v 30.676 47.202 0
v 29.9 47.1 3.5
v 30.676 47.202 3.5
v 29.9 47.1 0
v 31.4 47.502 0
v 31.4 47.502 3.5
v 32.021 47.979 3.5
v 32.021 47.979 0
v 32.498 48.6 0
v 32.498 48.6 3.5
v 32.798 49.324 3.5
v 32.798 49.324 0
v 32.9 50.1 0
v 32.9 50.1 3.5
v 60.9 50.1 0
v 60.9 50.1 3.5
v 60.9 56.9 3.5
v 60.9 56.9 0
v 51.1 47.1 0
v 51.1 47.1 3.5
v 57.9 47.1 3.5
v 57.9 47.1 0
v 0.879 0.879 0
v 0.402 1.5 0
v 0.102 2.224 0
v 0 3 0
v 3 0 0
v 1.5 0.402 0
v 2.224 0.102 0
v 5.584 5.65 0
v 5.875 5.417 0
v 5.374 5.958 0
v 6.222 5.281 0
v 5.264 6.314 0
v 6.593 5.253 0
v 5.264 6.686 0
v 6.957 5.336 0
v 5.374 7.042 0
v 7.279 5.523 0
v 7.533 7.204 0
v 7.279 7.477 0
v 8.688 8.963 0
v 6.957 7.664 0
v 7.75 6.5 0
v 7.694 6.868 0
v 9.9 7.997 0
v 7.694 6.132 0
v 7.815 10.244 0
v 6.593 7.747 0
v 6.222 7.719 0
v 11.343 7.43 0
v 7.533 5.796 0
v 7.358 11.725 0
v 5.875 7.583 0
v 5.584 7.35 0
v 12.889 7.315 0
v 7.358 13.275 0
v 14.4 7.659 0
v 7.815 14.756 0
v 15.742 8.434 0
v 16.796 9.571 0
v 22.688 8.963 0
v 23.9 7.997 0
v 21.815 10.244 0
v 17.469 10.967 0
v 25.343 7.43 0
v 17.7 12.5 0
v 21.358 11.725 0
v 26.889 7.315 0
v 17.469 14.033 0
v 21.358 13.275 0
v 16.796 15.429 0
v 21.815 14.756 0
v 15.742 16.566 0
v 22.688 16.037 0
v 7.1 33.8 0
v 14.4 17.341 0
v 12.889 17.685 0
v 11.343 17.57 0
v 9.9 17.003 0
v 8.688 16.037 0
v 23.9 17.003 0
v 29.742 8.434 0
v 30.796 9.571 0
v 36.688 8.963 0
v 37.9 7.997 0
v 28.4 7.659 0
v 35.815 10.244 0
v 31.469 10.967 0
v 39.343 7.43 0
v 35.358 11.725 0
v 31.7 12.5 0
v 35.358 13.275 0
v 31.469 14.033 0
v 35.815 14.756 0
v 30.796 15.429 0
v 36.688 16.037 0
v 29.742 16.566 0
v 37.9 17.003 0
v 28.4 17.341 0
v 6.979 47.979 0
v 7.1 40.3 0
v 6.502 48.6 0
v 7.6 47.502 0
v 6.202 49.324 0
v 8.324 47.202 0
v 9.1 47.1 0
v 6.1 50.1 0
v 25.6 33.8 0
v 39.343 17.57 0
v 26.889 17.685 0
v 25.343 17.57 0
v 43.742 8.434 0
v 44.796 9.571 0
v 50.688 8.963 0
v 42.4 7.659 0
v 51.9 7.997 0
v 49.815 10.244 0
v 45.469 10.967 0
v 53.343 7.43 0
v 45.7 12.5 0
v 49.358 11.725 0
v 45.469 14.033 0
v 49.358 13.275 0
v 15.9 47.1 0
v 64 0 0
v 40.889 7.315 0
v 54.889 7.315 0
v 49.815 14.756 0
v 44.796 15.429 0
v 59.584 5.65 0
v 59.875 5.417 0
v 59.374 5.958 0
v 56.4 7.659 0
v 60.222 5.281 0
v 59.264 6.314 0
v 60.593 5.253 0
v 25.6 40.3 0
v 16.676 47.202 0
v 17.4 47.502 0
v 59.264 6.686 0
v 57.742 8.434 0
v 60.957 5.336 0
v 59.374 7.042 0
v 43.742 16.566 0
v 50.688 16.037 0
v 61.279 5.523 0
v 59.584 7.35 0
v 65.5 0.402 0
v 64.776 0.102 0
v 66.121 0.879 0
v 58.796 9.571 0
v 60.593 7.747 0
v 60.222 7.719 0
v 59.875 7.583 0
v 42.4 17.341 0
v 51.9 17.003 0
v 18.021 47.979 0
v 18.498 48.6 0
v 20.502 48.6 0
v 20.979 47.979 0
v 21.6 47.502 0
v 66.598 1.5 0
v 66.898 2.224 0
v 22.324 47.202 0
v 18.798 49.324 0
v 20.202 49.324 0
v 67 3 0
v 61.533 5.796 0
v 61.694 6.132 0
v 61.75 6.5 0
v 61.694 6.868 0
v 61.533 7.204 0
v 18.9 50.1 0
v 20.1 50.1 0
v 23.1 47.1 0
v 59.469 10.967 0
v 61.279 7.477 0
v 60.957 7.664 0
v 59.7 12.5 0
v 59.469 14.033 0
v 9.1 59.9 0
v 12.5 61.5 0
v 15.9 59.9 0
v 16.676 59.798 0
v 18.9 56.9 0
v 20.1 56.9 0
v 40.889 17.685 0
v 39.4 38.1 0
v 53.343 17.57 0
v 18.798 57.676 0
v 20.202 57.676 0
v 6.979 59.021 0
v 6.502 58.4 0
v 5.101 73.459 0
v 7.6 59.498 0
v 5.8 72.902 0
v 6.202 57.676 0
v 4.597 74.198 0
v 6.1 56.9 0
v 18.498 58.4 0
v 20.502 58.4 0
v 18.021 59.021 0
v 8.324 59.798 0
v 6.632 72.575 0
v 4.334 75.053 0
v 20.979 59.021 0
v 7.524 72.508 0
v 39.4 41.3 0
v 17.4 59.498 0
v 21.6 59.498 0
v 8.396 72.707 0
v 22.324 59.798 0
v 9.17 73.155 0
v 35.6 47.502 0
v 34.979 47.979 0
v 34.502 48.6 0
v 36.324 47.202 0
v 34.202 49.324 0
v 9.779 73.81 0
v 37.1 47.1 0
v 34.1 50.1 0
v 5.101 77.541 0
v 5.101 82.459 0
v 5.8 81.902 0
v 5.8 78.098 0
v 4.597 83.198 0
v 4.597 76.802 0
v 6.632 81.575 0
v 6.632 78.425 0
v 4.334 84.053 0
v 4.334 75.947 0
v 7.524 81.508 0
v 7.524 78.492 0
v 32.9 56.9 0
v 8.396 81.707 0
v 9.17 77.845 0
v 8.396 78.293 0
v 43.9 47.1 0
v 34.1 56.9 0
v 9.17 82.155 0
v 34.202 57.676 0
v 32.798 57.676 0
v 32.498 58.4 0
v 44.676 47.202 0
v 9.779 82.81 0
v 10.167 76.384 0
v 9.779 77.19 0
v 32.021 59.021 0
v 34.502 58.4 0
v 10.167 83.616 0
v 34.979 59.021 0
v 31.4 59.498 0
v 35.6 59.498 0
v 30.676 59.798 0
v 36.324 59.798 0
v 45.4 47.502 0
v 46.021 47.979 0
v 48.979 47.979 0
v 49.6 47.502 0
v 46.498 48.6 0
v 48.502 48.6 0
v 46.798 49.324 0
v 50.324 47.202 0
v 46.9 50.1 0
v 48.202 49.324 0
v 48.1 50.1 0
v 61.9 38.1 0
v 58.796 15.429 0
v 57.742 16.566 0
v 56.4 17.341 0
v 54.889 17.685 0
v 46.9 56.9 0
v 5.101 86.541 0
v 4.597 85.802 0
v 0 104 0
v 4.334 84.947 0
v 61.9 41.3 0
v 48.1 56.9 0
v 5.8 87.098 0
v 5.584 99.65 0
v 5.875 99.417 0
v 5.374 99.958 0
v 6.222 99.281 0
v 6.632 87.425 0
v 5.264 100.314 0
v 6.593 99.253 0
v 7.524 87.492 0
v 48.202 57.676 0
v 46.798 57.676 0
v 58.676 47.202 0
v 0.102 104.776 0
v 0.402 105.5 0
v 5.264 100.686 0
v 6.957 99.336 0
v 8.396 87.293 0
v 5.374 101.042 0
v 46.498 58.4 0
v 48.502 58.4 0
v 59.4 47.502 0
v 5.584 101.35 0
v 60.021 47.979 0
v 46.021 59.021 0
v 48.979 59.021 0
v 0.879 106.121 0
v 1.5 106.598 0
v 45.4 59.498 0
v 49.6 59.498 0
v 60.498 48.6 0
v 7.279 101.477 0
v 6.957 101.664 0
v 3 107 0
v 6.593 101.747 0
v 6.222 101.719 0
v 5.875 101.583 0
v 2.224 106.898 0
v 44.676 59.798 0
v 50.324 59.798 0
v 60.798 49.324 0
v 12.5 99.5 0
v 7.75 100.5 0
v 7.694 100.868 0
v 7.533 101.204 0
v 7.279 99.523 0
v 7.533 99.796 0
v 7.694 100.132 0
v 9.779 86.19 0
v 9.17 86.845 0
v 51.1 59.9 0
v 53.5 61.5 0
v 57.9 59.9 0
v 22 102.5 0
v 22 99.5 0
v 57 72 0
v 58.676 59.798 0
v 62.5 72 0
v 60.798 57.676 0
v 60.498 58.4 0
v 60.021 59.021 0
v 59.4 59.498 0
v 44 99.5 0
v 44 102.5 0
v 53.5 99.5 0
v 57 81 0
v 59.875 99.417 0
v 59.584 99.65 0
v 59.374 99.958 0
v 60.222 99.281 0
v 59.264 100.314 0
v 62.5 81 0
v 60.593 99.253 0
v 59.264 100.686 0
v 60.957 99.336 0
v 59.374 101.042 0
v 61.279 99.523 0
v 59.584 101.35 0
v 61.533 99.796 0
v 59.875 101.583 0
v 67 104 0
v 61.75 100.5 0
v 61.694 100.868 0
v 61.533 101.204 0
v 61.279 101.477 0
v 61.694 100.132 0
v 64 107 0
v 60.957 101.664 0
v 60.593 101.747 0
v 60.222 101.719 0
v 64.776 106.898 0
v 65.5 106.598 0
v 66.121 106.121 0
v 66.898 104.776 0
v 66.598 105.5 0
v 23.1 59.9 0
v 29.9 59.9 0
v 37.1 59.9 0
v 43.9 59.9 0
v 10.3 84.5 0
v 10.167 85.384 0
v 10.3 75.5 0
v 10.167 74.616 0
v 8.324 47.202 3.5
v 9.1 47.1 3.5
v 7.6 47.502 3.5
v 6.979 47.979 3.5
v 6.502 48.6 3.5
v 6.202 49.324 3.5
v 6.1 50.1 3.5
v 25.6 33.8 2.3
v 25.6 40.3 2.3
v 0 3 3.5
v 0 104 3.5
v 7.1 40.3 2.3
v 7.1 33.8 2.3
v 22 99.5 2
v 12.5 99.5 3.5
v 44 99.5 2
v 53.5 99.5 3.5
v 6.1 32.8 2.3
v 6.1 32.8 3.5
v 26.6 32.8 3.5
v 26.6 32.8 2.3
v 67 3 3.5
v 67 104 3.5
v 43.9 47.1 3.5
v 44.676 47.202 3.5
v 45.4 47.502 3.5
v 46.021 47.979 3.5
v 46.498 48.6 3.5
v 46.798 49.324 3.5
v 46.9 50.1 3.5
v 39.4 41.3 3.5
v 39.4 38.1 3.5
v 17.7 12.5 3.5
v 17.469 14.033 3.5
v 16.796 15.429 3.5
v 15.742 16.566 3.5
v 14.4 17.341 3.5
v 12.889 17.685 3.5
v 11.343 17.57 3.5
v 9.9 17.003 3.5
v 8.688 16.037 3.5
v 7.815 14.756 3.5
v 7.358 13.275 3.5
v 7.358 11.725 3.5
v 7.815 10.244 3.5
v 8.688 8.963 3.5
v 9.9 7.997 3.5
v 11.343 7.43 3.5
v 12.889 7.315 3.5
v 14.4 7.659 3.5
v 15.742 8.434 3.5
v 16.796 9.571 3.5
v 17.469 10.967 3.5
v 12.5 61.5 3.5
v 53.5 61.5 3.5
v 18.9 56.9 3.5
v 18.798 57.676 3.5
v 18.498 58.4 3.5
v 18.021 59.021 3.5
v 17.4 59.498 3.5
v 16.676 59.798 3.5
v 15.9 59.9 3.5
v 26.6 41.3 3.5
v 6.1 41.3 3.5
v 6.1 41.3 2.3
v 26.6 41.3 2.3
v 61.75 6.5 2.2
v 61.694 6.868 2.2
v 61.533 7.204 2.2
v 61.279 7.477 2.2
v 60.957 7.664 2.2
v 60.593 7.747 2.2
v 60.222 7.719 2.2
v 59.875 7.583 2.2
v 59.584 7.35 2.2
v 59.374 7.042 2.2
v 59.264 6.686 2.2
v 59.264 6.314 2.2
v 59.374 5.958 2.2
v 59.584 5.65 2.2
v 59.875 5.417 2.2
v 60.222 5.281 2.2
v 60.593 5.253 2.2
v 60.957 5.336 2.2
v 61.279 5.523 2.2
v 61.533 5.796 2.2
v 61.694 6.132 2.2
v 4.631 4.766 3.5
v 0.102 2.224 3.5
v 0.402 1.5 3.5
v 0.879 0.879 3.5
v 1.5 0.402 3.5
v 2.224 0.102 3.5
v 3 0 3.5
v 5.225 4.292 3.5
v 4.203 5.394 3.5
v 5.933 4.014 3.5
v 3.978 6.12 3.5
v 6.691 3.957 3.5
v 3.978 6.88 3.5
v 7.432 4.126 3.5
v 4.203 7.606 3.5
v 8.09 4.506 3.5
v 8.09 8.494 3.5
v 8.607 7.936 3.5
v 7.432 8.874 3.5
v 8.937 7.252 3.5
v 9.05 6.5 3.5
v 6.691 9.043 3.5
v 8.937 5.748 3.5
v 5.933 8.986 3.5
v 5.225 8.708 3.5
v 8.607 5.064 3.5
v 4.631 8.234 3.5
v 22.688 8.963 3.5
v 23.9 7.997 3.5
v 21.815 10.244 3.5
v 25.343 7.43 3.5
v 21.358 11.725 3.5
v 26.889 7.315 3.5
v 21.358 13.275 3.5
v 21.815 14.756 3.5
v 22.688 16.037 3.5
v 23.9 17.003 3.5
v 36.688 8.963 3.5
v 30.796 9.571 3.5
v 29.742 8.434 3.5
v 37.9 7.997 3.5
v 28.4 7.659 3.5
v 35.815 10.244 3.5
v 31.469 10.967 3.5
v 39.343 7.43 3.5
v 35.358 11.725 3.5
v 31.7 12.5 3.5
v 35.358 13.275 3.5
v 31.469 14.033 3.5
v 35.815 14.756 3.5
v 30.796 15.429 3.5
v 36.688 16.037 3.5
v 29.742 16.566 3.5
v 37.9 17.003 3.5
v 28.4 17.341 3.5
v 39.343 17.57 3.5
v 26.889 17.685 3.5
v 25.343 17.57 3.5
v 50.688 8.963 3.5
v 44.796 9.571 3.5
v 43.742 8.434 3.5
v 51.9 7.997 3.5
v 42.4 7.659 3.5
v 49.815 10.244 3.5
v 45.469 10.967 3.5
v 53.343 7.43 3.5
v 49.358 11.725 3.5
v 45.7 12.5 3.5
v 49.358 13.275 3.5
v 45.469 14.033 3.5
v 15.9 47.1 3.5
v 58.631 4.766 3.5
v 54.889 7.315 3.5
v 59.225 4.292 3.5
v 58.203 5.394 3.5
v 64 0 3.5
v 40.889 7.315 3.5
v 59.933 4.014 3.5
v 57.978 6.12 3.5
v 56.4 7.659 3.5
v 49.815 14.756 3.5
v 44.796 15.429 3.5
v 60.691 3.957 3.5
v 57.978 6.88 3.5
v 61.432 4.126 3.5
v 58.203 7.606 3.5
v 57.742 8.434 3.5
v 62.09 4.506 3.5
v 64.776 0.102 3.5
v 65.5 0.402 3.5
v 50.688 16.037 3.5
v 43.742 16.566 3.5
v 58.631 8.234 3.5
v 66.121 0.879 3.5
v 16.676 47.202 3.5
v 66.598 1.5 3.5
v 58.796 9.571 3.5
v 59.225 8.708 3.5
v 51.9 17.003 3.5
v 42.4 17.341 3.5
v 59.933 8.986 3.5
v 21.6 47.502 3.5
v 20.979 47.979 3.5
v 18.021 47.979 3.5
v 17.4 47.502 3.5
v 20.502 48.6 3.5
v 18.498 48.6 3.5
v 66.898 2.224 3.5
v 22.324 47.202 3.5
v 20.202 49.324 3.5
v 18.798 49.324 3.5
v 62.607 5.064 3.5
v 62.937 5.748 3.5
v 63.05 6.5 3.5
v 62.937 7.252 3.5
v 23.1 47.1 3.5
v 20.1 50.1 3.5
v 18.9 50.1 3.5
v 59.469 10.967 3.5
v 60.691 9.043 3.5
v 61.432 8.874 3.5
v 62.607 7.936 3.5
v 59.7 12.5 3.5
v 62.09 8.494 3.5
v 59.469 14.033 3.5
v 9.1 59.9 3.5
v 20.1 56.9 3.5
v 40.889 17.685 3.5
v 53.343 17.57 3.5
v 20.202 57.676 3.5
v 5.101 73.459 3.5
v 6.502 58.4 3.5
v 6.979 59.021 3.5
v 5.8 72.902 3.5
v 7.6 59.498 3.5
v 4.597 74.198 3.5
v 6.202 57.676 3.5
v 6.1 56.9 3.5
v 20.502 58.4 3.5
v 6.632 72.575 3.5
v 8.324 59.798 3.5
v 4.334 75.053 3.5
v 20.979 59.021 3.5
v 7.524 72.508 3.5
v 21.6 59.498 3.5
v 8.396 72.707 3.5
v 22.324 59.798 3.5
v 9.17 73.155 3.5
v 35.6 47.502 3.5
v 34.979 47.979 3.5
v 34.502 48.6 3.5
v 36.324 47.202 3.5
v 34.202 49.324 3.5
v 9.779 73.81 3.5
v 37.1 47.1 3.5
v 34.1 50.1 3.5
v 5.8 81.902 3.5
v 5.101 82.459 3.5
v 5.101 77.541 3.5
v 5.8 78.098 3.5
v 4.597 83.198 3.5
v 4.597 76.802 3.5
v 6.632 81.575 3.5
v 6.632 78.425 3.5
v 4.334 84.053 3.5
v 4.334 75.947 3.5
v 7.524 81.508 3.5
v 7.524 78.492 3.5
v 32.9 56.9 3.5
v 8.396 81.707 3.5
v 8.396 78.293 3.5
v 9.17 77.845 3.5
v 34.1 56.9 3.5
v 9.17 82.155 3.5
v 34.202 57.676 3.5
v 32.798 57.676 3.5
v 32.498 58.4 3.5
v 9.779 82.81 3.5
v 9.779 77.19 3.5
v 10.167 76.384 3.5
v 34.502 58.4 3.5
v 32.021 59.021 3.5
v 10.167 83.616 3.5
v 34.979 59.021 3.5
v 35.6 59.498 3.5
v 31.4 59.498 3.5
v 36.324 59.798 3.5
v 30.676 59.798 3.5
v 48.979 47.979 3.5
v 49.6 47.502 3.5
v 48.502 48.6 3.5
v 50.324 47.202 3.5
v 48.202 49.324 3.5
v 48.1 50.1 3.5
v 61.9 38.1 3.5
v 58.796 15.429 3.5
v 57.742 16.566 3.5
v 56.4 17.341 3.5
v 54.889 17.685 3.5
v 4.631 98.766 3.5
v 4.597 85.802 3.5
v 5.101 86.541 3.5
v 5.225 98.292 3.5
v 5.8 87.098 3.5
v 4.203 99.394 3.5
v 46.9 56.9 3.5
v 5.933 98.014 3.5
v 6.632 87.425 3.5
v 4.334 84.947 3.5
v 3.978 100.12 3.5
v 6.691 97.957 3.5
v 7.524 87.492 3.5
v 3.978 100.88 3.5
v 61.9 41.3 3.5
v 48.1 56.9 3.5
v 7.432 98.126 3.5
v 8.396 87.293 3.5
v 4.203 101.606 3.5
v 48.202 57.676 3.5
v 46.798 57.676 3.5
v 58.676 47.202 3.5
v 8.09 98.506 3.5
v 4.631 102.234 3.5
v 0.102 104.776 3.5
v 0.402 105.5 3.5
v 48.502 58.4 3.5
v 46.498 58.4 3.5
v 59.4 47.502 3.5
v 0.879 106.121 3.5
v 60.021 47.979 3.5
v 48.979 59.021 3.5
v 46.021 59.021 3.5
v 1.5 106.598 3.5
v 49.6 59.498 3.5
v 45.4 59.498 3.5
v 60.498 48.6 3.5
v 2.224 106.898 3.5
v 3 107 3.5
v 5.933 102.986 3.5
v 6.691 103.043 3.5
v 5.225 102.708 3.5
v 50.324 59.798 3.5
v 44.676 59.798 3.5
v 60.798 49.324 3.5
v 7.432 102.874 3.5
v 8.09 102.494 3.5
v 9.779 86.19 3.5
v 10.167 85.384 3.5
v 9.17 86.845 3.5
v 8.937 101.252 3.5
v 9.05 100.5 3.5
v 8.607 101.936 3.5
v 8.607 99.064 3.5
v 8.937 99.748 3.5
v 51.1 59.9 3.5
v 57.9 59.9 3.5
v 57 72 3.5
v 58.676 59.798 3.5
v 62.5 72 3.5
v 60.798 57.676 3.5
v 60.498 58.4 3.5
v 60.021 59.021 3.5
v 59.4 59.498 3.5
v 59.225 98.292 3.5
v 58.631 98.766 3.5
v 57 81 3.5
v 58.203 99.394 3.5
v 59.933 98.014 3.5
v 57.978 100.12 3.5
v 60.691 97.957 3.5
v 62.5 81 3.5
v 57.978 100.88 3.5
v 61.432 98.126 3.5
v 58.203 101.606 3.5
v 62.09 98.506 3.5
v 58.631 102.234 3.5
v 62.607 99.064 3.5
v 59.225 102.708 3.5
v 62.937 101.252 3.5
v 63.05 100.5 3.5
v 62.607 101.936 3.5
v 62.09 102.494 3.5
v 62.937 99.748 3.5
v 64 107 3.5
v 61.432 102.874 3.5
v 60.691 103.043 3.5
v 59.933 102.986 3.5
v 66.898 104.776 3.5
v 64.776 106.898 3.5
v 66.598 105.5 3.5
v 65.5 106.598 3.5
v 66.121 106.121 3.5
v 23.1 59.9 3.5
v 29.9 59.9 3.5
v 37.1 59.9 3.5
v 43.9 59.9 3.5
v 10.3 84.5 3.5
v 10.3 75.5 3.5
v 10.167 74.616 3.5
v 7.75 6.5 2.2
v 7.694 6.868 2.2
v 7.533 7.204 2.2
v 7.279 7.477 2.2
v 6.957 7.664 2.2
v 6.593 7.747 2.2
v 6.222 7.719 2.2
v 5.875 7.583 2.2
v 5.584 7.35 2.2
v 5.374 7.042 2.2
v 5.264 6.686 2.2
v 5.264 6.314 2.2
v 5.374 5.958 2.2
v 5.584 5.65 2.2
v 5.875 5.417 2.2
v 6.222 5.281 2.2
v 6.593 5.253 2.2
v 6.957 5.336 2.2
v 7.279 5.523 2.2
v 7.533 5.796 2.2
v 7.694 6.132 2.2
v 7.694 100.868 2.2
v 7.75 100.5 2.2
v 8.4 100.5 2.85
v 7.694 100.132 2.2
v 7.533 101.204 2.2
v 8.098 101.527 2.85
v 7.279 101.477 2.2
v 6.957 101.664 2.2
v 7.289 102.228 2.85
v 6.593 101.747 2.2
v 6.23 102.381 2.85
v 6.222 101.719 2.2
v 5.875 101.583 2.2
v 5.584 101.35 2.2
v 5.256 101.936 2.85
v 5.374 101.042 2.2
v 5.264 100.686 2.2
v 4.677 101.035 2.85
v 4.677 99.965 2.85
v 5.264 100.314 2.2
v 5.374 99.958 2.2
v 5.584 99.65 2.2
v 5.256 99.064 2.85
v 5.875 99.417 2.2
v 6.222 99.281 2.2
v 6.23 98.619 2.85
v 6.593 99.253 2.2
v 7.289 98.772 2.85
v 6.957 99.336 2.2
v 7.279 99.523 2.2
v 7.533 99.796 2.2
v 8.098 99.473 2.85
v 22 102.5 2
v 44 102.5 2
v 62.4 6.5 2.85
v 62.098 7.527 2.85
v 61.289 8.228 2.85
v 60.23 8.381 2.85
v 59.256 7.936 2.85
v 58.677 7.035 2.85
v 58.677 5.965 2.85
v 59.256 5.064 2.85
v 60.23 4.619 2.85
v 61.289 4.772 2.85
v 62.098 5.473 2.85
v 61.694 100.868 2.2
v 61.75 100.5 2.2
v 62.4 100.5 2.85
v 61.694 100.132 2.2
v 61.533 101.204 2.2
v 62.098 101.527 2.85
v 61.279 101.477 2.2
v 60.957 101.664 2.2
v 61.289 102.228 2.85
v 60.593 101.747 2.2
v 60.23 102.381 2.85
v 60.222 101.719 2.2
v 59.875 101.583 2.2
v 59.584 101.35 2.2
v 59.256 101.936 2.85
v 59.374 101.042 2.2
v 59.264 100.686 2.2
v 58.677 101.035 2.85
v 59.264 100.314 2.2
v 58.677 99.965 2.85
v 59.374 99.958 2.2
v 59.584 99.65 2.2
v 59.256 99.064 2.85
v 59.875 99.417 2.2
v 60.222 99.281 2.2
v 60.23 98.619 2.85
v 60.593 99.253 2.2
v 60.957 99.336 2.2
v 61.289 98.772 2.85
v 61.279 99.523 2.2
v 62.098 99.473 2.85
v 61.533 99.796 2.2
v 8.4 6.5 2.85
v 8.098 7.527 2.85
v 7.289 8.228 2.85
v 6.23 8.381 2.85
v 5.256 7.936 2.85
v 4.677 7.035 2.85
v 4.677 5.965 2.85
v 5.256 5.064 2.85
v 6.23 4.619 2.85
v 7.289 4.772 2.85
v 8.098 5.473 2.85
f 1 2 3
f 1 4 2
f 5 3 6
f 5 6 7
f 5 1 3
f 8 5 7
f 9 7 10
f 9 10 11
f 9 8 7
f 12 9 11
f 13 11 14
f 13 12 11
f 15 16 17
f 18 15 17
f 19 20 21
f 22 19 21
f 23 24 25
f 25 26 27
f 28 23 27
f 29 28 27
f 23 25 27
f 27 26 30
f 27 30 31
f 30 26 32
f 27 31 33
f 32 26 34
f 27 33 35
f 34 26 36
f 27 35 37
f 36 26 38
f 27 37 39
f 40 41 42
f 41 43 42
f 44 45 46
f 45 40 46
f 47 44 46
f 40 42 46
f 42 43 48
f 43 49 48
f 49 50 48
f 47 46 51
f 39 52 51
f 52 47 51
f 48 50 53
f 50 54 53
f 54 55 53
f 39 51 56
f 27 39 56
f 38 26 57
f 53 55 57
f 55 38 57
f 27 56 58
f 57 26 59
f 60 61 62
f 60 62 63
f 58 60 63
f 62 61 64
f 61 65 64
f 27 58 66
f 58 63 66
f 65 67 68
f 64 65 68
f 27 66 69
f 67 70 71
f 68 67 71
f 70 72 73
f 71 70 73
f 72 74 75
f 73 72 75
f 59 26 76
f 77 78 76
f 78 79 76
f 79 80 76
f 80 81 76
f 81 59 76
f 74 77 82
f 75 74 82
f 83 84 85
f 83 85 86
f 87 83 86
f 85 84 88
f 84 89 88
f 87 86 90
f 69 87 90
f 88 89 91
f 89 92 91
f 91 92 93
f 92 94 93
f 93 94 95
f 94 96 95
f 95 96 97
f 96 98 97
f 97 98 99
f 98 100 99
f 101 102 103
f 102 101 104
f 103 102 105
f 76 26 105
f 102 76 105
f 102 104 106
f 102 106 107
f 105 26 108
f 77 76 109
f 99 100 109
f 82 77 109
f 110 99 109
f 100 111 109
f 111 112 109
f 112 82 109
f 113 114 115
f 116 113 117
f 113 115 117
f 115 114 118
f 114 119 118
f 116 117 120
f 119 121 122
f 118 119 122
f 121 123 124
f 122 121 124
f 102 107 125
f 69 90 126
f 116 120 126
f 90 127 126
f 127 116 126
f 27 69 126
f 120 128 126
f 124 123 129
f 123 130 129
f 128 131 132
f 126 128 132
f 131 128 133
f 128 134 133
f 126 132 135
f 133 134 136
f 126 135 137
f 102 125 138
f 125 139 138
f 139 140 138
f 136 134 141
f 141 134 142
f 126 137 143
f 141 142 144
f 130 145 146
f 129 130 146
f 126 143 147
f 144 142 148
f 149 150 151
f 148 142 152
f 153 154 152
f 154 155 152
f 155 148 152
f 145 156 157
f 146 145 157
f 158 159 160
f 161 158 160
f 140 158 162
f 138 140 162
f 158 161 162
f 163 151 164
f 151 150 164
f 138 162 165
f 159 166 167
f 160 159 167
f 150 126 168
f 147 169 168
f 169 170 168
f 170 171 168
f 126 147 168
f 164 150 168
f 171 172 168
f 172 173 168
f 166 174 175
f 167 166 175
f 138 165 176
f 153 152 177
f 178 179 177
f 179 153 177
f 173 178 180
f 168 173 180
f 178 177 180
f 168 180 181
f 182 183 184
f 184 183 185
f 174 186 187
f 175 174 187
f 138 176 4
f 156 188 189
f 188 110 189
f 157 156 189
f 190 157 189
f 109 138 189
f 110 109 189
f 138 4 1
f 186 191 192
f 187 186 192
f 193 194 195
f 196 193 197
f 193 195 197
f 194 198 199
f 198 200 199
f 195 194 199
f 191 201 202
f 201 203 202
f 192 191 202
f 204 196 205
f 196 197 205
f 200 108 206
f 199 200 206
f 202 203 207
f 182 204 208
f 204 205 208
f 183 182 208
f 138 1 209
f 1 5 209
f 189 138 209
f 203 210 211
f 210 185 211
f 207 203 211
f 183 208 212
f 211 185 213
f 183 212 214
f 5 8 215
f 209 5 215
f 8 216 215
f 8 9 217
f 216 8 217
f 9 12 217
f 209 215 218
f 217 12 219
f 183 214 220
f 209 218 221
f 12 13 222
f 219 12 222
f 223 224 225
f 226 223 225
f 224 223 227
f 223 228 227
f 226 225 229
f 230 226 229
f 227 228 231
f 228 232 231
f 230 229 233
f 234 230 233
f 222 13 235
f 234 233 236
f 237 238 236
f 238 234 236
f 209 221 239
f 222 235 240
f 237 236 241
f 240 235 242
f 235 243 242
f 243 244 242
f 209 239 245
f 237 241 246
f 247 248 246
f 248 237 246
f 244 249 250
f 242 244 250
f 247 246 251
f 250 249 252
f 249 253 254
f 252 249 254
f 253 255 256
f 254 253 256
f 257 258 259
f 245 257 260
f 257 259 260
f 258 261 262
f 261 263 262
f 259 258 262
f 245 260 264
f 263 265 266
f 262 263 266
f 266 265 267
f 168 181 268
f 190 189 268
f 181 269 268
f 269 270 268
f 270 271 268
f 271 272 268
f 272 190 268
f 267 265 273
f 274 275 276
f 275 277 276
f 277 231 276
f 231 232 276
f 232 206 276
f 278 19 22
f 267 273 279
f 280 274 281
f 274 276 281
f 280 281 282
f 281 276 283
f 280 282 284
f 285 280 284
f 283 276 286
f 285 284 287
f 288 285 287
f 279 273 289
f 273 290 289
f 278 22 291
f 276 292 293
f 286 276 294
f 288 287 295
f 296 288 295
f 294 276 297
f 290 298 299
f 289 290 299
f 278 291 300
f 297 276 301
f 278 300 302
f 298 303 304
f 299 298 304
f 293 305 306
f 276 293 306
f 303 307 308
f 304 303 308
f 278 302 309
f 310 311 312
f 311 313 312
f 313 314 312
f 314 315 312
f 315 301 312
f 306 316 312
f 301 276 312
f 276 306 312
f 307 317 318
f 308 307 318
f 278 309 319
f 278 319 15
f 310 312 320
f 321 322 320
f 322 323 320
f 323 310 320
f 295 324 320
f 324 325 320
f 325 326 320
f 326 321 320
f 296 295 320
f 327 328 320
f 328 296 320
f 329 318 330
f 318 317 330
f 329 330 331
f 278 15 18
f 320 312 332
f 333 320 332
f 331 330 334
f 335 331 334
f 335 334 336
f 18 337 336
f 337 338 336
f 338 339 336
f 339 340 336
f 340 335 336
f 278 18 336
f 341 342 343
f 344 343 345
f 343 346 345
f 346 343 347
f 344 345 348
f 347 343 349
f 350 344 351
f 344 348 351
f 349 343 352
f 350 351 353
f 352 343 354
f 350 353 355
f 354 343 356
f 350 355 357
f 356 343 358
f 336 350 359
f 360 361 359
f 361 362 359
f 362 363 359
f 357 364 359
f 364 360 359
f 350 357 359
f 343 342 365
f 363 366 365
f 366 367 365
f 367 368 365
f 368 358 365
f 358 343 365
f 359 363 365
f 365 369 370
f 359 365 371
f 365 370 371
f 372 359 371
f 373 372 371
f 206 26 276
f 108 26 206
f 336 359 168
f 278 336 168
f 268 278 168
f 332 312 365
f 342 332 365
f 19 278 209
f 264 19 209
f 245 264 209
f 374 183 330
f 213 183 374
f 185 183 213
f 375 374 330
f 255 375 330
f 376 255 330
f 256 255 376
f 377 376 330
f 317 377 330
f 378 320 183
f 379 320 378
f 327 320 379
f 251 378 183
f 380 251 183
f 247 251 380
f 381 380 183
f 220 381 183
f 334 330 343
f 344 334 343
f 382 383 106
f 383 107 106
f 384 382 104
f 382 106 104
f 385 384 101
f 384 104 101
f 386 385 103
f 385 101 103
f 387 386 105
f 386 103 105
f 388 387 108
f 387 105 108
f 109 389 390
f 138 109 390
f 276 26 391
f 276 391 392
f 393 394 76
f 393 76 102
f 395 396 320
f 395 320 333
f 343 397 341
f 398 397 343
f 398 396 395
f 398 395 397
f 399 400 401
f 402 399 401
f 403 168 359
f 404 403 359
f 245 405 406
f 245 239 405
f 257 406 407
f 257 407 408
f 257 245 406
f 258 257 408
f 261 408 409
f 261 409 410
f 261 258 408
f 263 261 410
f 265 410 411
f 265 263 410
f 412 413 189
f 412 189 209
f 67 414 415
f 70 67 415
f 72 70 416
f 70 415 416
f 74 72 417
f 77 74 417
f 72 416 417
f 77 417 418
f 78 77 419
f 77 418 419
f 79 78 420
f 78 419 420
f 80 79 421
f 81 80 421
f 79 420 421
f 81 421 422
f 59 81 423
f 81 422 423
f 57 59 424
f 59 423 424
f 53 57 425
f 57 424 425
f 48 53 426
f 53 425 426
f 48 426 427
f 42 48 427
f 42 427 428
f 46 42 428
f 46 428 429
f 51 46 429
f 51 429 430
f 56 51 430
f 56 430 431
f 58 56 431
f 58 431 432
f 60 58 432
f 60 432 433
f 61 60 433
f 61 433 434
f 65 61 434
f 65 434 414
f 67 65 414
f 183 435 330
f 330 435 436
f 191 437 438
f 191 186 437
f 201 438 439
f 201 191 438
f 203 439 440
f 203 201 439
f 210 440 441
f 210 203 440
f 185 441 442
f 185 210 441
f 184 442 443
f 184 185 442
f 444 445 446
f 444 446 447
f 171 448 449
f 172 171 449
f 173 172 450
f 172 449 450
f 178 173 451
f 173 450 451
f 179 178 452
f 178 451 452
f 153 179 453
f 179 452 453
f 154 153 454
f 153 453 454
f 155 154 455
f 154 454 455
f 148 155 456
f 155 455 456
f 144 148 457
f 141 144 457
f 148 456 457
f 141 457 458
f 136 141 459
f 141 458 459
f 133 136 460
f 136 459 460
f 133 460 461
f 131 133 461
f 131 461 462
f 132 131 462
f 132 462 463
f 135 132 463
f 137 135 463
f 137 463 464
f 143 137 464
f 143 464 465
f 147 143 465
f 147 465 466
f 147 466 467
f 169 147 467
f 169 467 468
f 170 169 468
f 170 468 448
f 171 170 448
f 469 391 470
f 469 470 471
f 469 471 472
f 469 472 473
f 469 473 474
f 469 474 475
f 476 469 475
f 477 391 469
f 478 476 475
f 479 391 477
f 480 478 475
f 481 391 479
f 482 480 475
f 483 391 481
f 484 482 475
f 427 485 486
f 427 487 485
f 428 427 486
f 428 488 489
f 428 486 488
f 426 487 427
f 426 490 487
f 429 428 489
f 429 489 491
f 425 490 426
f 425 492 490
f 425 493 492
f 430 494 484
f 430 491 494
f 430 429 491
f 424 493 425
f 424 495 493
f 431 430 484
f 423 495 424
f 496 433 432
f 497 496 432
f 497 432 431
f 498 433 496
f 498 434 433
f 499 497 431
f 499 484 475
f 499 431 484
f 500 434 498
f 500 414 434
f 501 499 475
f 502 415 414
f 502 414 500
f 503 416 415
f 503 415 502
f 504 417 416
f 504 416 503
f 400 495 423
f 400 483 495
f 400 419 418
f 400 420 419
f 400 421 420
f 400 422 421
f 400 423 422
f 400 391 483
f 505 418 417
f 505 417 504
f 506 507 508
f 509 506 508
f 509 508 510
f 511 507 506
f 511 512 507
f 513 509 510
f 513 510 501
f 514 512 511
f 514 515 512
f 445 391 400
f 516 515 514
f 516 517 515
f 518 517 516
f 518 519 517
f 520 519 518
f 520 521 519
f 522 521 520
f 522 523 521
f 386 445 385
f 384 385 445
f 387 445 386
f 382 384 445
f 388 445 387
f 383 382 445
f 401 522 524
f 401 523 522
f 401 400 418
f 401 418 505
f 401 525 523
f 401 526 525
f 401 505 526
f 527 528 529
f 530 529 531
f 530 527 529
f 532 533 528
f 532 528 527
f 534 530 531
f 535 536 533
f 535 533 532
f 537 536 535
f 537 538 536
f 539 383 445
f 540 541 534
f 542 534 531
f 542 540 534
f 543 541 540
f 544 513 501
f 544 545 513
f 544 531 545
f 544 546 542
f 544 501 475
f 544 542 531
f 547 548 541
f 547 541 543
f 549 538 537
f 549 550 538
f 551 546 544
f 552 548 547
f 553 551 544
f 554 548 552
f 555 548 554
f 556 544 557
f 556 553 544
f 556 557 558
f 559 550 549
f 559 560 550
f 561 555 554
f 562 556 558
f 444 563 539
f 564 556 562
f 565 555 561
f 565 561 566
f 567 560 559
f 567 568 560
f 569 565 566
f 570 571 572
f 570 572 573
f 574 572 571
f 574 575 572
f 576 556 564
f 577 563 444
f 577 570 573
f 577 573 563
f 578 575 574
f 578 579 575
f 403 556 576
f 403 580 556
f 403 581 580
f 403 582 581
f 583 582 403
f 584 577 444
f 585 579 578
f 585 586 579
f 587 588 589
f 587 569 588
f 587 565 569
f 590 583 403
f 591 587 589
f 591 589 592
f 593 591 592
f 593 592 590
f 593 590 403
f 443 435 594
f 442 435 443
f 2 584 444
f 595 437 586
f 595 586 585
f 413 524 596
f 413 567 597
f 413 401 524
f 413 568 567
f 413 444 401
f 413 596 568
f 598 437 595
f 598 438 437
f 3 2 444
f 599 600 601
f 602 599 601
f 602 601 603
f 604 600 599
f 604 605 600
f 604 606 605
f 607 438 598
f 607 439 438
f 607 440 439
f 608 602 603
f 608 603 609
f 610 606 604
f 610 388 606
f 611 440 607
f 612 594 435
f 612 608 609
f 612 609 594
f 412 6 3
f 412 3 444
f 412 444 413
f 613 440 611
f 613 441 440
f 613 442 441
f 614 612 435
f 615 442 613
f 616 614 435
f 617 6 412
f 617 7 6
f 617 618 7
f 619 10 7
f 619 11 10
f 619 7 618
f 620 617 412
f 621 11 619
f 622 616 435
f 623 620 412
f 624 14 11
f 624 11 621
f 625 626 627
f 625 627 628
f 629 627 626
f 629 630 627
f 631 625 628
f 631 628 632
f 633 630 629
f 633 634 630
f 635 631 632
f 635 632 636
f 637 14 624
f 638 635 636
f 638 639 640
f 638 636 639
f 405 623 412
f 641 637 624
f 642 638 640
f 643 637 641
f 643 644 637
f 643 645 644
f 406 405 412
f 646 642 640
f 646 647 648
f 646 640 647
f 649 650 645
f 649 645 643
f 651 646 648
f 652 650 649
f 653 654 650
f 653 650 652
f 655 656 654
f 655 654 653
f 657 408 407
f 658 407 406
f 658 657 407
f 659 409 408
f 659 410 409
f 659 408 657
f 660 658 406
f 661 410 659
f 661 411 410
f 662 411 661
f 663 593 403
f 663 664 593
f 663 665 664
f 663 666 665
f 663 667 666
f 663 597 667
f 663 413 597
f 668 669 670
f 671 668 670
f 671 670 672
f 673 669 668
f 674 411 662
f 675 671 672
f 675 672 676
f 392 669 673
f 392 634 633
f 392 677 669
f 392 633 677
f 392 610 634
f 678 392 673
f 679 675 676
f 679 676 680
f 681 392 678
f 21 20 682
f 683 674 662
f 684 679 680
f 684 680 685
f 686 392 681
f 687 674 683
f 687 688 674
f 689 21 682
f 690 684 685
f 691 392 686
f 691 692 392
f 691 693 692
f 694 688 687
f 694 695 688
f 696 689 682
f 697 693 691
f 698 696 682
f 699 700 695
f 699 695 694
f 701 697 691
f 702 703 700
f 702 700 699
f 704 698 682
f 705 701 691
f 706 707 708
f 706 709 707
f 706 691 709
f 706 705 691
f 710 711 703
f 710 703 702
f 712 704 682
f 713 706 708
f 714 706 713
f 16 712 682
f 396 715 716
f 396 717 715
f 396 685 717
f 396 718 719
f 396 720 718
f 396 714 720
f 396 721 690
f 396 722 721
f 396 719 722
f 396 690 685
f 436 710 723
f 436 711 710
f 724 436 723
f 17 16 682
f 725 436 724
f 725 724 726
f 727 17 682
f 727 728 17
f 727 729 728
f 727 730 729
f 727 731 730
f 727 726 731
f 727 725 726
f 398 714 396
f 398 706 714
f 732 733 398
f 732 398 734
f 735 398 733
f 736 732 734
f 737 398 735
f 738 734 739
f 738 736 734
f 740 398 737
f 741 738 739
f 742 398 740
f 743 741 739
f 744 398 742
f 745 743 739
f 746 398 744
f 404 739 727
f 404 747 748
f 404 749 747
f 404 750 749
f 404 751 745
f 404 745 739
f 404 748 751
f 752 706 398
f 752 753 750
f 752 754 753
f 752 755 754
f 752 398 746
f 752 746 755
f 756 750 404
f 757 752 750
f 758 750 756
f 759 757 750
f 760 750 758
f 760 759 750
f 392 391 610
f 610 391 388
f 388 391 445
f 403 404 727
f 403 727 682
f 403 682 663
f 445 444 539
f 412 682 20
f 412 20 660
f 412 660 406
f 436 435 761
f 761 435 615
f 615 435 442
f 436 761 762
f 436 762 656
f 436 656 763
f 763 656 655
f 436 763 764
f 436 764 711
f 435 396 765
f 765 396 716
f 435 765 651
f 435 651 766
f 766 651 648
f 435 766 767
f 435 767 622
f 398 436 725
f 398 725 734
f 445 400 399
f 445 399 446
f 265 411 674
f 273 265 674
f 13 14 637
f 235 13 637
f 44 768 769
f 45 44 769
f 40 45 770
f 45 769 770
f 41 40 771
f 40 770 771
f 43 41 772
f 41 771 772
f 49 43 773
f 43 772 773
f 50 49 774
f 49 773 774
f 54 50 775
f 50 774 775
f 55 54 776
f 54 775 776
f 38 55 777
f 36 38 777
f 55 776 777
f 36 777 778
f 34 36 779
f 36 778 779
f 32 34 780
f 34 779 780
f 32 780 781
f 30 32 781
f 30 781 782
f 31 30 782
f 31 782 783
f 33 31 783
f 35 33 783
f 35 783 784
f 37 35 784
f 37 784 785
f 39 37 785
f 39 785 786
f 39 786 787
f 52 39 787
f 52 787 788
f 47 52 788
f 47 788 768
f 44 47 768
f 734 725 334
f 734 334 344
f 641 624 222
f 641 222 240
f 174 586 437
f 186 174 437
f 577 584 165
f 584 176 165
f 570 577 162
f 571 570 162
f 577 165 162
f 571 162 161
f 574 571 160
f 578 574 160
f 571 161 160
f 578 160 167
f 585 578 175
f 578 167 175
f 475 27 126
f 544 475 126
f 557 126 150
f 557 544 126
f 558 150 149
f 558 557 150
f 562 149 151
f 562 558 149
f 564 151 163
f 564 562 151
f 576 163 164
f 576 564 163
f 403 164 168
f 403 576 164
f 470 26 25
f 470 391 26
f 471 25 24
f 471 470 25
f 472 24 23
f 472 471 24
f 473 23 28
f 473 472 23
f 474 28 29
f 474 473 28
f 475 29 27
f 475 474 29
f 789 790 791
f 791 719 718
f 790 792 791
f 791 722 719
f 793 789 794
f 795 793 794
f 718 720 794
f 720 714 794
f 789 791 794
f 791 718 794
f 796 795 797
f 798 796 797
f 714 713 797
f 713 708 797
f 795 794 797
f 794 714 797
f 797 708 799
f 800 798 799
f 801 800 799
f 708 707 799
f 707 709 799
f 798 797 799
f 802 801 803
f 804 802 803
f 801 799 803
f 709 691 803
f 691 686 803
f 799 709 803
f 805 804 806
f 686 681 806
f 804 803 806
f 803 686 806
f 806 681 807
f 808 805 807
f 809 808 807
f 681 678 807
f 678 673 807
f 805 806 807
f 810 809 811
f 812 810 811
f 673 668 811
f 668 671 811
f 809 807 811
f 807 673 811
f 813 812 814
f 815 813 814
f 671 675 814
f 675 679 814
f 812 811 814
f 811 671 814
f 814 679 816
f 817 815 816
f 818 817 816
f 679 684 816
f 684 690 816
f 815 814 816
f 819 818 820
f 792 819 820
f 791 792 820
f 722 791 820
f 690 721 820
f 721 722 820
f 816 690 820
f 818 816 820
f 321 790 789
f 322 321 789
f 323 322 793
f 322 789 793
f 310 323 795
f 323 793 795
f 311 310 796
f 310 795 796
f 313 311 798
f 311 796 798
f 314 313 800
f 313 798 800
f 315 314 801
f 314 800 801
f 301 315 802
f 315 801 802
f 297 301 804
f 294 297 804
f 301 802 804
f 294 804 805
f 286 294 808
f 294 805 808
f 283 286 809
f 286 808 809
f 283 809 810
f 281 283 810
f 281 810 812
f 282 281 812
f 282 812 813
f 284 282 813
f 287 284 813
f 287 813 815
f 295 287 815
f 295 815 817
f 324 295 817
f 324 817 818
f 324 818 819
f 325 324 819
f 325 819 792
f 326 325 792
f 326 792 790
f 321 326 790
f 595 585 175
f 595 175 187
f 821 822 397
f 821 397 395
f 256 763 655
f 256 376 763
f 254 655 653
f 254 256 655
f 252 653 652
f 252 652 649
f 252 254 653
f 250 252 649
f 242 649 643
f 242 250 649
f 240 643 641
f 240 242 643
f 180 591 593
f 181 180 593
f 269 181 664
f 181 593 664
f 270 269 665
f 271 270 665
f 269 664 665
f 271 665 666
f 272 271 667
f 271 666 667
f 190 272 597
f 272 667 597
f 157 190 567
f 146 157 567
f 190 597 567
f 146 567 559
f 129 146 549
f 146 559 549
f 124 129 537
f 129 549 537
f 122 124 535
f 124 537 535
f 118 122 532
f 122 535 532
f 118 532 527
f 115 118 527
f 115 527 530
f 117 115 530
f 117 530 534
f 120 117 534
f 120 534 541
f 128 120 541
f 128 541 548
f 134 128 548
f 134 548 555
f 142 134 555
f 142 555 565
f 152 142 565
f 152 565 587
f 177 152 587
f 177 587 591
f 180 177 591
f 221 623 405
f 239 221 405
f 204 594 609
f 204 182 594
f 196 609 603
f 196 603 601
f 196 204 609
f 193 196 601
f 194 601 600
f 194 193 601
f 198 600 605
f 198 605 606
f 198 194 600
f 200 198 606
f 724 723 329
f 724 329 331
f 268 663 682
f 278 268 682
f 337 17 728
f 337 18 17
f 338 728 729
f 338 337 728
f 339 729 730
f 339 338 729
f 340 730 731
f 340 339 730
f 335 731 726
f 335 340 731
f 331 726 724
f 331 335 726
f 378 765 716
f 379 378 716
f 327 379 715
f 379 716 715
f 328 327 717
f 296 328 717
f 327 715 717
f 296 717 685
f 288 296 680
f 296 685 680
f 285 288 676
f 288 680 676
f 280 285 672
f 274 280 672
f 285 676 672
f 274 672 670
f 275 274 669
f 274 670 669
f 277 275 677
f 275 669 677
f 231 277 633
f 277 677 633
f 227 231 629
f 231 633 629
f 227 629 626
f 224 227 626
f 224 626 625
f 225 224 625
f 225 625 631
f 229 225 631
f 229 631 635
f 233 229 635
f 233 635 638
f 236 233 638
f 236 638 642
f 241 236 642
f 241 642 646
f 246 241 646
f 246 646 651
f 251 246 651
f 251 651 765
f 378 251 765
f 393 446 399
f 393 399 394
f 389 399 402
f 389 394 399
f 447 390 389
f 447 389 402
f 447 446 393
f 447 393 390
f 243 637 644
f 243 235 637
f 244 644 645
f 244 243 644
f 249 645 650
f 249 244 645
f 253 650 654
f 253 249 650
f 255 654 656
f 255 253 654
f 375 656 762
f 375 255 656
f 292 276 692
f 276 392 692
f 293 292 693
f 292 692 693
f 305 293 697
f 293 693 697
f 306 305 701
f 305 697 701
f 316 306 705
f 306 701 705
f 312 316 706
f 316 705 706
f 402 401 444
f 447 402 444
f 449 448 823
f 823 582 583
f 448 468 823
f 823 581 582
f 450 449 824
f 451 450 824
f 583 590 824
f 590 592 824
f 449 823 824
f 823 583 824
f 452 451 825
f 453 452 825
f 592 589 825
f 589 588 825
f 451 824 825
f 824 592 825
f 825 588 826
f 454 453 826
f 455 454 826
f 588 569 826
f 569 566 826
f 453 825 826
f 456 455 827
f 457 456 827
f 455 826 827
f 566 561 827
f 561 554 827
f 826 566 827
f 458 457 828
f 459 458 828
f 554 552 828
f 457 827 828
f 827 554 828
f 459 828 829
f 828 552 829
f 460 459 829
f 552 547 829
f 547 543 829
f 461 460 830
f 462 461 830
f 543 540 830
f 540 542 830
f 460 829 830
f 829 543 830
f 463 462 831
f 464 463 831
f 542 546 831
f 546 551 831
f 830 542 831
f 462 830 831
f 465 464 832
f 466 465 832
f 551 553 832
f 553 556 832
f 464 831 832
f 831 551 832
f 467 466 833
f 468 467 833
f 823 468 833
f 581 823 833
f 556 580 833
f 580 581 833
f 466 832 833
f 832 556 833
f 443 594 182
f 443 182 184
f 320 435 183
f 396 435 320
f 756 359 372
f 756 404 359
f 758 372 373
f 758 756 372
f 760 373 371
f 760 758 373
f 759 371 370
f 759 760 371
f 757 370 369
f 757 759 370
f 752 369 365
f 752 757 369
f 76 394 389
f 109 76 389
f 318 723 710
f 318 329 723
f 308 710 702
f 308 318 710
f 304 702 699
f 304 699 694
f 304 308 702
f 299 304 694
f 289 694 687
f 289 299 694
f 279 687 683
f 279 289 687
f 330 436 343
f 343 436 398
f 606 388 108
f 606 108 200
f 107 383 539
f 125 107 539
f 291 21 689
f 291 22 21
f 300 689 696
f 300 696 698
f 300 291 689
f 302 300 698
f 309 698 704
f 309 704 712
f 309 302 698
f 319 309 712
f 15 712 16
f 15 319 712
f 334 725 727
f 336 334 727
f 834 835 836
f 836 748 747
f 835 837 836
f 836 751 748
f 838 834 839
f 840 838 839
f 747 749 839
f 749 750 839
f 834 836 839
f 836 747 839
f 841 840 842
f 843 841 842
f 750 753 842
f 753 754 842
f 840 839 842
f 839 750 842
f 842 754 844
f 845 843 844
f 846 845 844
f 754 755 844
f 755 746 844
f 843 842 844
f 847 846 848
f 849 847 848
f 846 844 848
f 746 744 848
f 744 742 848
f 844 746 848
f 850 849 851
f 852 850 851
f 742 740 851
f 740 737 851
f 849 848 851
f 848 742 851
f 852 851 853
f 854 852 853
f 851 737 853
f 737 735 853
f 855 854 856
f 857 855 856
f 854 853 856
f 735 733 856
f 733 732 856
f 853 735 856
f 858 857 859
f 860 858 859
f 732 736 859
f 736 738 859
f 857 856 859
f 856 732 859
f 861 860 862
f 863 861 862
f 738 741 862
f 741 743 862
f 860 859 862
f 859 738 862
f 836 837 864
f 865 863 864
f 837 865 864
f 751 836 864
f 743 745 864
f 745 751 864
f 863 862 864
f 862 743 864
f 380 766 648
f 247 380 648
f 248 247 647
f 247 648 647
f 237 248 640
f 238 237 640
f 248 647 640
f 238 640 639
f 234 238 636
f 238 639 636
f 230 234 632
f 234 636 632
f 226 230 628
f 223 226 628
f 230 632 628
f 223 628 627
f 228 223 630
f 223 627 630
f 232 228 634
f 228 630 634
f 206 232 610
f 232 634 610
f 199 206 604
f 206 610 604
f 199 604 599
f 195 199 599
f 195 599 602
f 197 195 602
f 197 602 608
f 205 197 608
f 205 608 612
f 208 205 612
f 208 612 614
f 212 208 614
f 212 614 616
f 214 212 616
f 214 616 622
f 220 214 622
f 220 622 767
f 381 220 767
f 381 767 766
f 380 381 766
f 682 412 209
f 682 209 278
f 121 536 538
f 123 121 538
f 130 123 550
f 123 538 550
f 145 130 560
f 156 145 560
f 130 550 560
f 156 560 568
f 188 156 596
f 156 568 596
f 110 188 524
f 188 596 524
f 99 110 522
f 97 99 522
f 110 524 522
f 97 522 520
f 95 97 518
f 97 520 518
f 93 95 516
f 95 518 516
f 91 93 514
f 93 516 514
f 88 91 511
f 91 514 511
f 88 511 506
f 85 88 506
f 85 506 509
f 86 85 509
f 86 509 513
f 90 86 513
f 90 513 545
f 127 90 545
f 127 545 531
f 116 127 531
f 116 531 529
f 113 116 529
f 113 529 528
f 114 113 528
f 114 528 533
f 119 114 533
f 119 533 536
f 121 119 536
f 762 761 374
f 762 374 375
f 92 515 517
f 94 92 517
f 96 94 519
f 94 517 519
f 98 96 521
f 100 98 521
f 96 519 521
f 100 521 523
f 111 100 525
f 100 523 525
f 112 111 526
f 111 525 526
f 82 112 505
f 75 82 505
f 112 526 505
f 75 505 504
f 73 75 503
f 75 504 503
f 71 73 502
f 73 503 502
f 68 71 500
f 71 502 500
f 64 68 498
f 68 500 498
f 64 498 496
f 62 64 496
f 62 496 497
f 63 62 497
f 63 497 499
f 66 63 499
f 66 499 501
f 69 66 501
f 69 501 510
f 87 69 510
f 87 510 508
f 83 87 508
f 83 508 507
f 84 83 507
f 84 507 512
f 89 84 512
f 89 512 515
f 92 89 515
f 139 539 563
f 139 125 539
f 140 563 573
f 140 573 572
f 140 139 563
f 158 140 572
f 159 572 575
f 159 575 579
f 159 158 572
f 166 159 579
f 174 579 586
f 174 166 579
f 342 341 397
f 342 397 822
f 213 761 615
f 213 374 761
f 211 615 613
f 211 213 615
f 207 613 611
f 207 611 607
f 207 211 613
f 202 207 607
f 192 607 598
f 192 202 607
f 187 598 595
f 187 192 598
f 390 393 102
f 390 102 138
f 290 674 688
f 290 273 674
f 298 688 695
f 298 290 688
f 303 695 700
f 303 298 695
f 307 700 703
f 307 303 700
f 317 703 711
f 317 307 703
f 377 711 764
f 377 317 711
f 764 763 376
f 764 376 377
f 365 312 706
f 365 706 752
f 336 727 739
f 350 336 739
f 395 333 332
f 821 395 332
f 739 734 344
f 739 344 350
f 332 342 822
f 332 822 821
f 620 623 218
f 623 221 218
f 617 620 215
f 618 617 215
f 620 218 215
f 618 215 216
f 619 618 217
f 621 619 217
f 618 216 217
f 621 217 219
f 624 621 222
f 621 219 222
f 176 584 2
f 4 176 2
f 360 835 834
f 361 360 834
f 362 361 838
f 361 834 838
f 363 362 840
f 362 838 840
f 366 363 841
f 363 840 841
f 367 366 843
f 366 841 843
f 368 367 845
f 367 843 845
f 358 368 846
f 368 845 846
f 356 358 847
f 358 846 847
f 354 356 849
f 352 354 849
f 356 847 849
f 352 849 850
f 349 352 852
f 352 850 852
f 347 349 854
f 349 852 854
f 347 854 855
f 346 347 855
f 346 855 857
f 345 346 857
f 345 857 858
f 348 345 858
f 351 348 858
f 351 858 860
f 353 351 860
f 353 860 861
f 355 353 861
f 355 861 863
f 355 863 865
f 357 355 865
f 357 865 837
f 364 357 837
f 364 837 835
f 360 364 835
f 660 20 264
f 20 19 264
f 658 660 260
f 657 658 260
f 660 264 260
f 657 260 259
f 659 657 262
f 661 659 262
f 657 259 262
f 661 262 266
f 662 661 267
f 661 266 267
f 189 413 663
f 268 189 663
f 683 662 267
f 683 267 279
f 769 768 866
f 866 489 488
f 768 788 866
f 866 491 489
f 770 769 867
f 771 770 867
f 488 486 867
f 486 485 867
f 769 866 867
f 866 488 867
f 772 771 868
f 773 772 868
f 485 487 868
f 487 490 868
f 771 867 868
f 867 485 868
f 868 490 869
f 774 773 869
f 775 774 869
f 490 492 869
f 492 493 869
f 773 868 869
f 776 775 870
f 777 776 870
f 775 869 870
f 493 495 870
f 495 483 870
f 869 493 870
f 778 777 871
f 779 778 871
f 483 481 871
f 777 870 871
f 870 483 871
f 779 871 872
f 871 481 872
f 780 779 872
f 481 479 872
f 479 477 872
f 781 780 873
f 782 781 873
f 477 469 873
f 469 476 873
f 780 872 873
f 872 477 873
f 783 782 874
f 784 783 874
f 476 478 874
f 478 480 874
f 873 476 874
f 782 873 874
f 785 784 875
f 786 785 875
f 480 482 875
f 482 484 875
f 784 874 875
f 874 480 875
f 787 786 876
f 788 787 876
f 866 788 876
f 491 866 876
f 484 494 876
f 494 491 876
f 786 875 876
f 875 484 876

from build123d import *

# Parameters (mm, degrees)
SKICA1_W                 = 67
SKICA1_H                 = 107
P_IDAT_VYSUNUT_M1_DEPTH  = 3.5
ZAOBLIT1_R               = 3
SKICA2_R                 = 1.25
SKICA2_R_2               = 3
SKICA2_R_3               = 5.2
SKICA2_W                 = 41
SKICA2_H                 = 38
SKICA2_W_2               = 5.5
SKICA2_H_2               = 9
SKICA2_W_3               = 12.8
SKICA2_H_3               = 12.8
SKICA2_W_4               = 22.5
SKICA2_H_4               = 3.2
ODEBRAT_VYSUNUT_M1_DEPTH = 4.5
ZAOBLIT2_R               = 3
SKICA3_W                 = 22
SKICA3_H                 = 3
ODEBRAT_VYSUNUT_M2_DEPTH = 2
ZKOSEN_1_SIZE            = 1.3
SKICA4_W                 = 20.5
SKICA4_H                 = 8.5
ODEBRAT_VYSUNUT_M3_DEPTH = 1.2
SKICA5_W                 = 18.5
SKICA5_H                 = 6.5
ODEBRAT_VYSUNUT_M4_DEPTH = 3.3


with BuildPart() as part:
    # Skica1 → Přidat vysunutím1 (new body)
    with BuildSketch(Plane.XY):
        with Locations((33.5, 53.5)):
            Rectangle(SKICA1_W, SKICA1_H)
    extrude(amount=P_IDAT_VYSUNUT_M1_DEPTH)

    # Zaoblit1
    zaoblit1_edges = [part.edges().sort_by_distance(p)[0] for p in [
        (0, 107, 1.75),
        (67, 107, 1.75),
        (67, 0, 1.75),
        (0, 0, 1.75),
    ]]
    fillet(zaoblit1_edges, radius=ZAOBLIT1_R)

    # Skica2 → Odebrat vysunutím1 (cut, through all)
    with BuildSketch(Plane.XY.offset(3.5)):
        with Locations((6.5, 100.5)):
            Circle(SKICA2_R)
        with Locations((60.5, 100.5)):
            Circle(SKICA2_R)
        with Locations((6.5, 6.5)):
            Circle(SKICA2_R)
        with Locations((60.5, 6.5)):
            Circle(SKICA2_R)
        with Locations((7.3, 75.5)):
            Circle(SKICA2_R_2)
        with Locations((12.5, 12.5)):
            Circle(SKICA2_R_3)
        with Locations((26.5, 12.5)):
            Circle(SKICA2_R_3)
        with Locations((40.5, 12.5)):
            Circle(SKICA2_R_3)
        with Locations((54.5, 12.5)):
            Circle(SKICA2_R_3)
        with Locations((7.3, 84.5)):
            Circle(SKICA2_R_2)
        with Locations((33, 80.5)):
            Rectangle(SKICA2_W, SKICA2_H)
        with Locations((59.75, 76.5)):
            Rectangle(SKICA2_W_2, SKICA2_H_2)
        with Locations((54.5, 53.5)):
            Rectangle(SKICA2_W_3, SKICA2_H_3)
        with Locations((40.5, 53.5)):
            Rectangle(SKICA2_W_3, SKICA2_H_3)
        with Locations((26.5, 53.5)):
            Rectangle(SKICA2_W_3, SKICA2_H_3)
        with Locations((12.5, 53.5)):
            Rectangle(SKICA2_W_3, SKICA2_H_3)
        with Locations((50.65, 39.7)):
            Rectangle(SKICA2_W_4, SKICA2_H_4)
    extrude(amount=-ODEBRAT_VYSUNUT_M1_DEPTH, mode=Mode.SUBTRACT)

    # Zaoblit2
    zaoblit2_edges = [part.edges().sort_by_distance(p)[0] for p in [
        (6.1, 47.1, 1.75),
        (6.1, 59.9, 1.75),
        (18.9, 59.9, 1.75),
        (18.9, 47.1, 1.75),
        (20.1, 47.1, 1.75),
        (20.1, 59.9, 1.75),
        (32.9, 59.9, 1.75),
        (32.9, 47.1, 1.75),
        (34.1, 47.1, 1.75),
        (34.1, 59.9, 1.75),
        (46.9, 59.9, 1.75),
        (46.9, 47.1, 1.75),
        (48.1, 47.1, 1.75),
        (48.1, 59.9, 1.75),
        (60.9, 59.9, 1.75),
        (60.9, 47.1, 1.75),
    ]]
    fillet(zaoblit2_edges, radius=ZAOBLIT2_R)

    # Skica3 → Odebrat vysunutím2 (cut)
    with BuildSketch(Plane(origin=(0, 0, 0), x_dir=(-1, 0, 0), z_dir=(0, 0, -1))):
        with Locations((-33, 101)):
            Rectangle(SKICA3_W, SKICA3_H)
    extrude(amount=-ODEBRAT_VYSUNUT_M2_DEPTH, mode=Mode.SUBTRACT)

    # Zkosení1
    zkosen_1_edges = [part.edges().sort_by_distance(p)[0] for p in [
        (5.25, 6.5, 3.5),
        (59.25, 6.5, 3.5),
        (5.25, 100.5, 3.5),
        (59.25, 100.5, 3.5),
    ]]
    chamfer(zkosen_1_edges, length=ZKOSEN_1_SIZE)

    # Skica4 → Odebrat vysunutím3 (cut)
    with BuildSketch(Plane.XY.offset(3.5)):
        with Locations((16.35, 37.05)):
            Rectangle(SKICA4_W, SKICA4_H)
    extrude(amount=-ODEBRAT_VYSUNUT_M3_DEPTH, mode=Mode.SUBTRACT)

    # Skica5 → Odebrat vysunutím4 (cut, through all)
    with BuildSketch(Plane.XY.offset(2.3)):
        with Locations((16.35, 37.05)):
            Rectangle(SKICA5_W, SKICA5_H)
    extrude(amount=-ODEBRAT_VYSUNUT_M4_DEPTH, mode=Mode.SUBTRACT)


solid = part.part
